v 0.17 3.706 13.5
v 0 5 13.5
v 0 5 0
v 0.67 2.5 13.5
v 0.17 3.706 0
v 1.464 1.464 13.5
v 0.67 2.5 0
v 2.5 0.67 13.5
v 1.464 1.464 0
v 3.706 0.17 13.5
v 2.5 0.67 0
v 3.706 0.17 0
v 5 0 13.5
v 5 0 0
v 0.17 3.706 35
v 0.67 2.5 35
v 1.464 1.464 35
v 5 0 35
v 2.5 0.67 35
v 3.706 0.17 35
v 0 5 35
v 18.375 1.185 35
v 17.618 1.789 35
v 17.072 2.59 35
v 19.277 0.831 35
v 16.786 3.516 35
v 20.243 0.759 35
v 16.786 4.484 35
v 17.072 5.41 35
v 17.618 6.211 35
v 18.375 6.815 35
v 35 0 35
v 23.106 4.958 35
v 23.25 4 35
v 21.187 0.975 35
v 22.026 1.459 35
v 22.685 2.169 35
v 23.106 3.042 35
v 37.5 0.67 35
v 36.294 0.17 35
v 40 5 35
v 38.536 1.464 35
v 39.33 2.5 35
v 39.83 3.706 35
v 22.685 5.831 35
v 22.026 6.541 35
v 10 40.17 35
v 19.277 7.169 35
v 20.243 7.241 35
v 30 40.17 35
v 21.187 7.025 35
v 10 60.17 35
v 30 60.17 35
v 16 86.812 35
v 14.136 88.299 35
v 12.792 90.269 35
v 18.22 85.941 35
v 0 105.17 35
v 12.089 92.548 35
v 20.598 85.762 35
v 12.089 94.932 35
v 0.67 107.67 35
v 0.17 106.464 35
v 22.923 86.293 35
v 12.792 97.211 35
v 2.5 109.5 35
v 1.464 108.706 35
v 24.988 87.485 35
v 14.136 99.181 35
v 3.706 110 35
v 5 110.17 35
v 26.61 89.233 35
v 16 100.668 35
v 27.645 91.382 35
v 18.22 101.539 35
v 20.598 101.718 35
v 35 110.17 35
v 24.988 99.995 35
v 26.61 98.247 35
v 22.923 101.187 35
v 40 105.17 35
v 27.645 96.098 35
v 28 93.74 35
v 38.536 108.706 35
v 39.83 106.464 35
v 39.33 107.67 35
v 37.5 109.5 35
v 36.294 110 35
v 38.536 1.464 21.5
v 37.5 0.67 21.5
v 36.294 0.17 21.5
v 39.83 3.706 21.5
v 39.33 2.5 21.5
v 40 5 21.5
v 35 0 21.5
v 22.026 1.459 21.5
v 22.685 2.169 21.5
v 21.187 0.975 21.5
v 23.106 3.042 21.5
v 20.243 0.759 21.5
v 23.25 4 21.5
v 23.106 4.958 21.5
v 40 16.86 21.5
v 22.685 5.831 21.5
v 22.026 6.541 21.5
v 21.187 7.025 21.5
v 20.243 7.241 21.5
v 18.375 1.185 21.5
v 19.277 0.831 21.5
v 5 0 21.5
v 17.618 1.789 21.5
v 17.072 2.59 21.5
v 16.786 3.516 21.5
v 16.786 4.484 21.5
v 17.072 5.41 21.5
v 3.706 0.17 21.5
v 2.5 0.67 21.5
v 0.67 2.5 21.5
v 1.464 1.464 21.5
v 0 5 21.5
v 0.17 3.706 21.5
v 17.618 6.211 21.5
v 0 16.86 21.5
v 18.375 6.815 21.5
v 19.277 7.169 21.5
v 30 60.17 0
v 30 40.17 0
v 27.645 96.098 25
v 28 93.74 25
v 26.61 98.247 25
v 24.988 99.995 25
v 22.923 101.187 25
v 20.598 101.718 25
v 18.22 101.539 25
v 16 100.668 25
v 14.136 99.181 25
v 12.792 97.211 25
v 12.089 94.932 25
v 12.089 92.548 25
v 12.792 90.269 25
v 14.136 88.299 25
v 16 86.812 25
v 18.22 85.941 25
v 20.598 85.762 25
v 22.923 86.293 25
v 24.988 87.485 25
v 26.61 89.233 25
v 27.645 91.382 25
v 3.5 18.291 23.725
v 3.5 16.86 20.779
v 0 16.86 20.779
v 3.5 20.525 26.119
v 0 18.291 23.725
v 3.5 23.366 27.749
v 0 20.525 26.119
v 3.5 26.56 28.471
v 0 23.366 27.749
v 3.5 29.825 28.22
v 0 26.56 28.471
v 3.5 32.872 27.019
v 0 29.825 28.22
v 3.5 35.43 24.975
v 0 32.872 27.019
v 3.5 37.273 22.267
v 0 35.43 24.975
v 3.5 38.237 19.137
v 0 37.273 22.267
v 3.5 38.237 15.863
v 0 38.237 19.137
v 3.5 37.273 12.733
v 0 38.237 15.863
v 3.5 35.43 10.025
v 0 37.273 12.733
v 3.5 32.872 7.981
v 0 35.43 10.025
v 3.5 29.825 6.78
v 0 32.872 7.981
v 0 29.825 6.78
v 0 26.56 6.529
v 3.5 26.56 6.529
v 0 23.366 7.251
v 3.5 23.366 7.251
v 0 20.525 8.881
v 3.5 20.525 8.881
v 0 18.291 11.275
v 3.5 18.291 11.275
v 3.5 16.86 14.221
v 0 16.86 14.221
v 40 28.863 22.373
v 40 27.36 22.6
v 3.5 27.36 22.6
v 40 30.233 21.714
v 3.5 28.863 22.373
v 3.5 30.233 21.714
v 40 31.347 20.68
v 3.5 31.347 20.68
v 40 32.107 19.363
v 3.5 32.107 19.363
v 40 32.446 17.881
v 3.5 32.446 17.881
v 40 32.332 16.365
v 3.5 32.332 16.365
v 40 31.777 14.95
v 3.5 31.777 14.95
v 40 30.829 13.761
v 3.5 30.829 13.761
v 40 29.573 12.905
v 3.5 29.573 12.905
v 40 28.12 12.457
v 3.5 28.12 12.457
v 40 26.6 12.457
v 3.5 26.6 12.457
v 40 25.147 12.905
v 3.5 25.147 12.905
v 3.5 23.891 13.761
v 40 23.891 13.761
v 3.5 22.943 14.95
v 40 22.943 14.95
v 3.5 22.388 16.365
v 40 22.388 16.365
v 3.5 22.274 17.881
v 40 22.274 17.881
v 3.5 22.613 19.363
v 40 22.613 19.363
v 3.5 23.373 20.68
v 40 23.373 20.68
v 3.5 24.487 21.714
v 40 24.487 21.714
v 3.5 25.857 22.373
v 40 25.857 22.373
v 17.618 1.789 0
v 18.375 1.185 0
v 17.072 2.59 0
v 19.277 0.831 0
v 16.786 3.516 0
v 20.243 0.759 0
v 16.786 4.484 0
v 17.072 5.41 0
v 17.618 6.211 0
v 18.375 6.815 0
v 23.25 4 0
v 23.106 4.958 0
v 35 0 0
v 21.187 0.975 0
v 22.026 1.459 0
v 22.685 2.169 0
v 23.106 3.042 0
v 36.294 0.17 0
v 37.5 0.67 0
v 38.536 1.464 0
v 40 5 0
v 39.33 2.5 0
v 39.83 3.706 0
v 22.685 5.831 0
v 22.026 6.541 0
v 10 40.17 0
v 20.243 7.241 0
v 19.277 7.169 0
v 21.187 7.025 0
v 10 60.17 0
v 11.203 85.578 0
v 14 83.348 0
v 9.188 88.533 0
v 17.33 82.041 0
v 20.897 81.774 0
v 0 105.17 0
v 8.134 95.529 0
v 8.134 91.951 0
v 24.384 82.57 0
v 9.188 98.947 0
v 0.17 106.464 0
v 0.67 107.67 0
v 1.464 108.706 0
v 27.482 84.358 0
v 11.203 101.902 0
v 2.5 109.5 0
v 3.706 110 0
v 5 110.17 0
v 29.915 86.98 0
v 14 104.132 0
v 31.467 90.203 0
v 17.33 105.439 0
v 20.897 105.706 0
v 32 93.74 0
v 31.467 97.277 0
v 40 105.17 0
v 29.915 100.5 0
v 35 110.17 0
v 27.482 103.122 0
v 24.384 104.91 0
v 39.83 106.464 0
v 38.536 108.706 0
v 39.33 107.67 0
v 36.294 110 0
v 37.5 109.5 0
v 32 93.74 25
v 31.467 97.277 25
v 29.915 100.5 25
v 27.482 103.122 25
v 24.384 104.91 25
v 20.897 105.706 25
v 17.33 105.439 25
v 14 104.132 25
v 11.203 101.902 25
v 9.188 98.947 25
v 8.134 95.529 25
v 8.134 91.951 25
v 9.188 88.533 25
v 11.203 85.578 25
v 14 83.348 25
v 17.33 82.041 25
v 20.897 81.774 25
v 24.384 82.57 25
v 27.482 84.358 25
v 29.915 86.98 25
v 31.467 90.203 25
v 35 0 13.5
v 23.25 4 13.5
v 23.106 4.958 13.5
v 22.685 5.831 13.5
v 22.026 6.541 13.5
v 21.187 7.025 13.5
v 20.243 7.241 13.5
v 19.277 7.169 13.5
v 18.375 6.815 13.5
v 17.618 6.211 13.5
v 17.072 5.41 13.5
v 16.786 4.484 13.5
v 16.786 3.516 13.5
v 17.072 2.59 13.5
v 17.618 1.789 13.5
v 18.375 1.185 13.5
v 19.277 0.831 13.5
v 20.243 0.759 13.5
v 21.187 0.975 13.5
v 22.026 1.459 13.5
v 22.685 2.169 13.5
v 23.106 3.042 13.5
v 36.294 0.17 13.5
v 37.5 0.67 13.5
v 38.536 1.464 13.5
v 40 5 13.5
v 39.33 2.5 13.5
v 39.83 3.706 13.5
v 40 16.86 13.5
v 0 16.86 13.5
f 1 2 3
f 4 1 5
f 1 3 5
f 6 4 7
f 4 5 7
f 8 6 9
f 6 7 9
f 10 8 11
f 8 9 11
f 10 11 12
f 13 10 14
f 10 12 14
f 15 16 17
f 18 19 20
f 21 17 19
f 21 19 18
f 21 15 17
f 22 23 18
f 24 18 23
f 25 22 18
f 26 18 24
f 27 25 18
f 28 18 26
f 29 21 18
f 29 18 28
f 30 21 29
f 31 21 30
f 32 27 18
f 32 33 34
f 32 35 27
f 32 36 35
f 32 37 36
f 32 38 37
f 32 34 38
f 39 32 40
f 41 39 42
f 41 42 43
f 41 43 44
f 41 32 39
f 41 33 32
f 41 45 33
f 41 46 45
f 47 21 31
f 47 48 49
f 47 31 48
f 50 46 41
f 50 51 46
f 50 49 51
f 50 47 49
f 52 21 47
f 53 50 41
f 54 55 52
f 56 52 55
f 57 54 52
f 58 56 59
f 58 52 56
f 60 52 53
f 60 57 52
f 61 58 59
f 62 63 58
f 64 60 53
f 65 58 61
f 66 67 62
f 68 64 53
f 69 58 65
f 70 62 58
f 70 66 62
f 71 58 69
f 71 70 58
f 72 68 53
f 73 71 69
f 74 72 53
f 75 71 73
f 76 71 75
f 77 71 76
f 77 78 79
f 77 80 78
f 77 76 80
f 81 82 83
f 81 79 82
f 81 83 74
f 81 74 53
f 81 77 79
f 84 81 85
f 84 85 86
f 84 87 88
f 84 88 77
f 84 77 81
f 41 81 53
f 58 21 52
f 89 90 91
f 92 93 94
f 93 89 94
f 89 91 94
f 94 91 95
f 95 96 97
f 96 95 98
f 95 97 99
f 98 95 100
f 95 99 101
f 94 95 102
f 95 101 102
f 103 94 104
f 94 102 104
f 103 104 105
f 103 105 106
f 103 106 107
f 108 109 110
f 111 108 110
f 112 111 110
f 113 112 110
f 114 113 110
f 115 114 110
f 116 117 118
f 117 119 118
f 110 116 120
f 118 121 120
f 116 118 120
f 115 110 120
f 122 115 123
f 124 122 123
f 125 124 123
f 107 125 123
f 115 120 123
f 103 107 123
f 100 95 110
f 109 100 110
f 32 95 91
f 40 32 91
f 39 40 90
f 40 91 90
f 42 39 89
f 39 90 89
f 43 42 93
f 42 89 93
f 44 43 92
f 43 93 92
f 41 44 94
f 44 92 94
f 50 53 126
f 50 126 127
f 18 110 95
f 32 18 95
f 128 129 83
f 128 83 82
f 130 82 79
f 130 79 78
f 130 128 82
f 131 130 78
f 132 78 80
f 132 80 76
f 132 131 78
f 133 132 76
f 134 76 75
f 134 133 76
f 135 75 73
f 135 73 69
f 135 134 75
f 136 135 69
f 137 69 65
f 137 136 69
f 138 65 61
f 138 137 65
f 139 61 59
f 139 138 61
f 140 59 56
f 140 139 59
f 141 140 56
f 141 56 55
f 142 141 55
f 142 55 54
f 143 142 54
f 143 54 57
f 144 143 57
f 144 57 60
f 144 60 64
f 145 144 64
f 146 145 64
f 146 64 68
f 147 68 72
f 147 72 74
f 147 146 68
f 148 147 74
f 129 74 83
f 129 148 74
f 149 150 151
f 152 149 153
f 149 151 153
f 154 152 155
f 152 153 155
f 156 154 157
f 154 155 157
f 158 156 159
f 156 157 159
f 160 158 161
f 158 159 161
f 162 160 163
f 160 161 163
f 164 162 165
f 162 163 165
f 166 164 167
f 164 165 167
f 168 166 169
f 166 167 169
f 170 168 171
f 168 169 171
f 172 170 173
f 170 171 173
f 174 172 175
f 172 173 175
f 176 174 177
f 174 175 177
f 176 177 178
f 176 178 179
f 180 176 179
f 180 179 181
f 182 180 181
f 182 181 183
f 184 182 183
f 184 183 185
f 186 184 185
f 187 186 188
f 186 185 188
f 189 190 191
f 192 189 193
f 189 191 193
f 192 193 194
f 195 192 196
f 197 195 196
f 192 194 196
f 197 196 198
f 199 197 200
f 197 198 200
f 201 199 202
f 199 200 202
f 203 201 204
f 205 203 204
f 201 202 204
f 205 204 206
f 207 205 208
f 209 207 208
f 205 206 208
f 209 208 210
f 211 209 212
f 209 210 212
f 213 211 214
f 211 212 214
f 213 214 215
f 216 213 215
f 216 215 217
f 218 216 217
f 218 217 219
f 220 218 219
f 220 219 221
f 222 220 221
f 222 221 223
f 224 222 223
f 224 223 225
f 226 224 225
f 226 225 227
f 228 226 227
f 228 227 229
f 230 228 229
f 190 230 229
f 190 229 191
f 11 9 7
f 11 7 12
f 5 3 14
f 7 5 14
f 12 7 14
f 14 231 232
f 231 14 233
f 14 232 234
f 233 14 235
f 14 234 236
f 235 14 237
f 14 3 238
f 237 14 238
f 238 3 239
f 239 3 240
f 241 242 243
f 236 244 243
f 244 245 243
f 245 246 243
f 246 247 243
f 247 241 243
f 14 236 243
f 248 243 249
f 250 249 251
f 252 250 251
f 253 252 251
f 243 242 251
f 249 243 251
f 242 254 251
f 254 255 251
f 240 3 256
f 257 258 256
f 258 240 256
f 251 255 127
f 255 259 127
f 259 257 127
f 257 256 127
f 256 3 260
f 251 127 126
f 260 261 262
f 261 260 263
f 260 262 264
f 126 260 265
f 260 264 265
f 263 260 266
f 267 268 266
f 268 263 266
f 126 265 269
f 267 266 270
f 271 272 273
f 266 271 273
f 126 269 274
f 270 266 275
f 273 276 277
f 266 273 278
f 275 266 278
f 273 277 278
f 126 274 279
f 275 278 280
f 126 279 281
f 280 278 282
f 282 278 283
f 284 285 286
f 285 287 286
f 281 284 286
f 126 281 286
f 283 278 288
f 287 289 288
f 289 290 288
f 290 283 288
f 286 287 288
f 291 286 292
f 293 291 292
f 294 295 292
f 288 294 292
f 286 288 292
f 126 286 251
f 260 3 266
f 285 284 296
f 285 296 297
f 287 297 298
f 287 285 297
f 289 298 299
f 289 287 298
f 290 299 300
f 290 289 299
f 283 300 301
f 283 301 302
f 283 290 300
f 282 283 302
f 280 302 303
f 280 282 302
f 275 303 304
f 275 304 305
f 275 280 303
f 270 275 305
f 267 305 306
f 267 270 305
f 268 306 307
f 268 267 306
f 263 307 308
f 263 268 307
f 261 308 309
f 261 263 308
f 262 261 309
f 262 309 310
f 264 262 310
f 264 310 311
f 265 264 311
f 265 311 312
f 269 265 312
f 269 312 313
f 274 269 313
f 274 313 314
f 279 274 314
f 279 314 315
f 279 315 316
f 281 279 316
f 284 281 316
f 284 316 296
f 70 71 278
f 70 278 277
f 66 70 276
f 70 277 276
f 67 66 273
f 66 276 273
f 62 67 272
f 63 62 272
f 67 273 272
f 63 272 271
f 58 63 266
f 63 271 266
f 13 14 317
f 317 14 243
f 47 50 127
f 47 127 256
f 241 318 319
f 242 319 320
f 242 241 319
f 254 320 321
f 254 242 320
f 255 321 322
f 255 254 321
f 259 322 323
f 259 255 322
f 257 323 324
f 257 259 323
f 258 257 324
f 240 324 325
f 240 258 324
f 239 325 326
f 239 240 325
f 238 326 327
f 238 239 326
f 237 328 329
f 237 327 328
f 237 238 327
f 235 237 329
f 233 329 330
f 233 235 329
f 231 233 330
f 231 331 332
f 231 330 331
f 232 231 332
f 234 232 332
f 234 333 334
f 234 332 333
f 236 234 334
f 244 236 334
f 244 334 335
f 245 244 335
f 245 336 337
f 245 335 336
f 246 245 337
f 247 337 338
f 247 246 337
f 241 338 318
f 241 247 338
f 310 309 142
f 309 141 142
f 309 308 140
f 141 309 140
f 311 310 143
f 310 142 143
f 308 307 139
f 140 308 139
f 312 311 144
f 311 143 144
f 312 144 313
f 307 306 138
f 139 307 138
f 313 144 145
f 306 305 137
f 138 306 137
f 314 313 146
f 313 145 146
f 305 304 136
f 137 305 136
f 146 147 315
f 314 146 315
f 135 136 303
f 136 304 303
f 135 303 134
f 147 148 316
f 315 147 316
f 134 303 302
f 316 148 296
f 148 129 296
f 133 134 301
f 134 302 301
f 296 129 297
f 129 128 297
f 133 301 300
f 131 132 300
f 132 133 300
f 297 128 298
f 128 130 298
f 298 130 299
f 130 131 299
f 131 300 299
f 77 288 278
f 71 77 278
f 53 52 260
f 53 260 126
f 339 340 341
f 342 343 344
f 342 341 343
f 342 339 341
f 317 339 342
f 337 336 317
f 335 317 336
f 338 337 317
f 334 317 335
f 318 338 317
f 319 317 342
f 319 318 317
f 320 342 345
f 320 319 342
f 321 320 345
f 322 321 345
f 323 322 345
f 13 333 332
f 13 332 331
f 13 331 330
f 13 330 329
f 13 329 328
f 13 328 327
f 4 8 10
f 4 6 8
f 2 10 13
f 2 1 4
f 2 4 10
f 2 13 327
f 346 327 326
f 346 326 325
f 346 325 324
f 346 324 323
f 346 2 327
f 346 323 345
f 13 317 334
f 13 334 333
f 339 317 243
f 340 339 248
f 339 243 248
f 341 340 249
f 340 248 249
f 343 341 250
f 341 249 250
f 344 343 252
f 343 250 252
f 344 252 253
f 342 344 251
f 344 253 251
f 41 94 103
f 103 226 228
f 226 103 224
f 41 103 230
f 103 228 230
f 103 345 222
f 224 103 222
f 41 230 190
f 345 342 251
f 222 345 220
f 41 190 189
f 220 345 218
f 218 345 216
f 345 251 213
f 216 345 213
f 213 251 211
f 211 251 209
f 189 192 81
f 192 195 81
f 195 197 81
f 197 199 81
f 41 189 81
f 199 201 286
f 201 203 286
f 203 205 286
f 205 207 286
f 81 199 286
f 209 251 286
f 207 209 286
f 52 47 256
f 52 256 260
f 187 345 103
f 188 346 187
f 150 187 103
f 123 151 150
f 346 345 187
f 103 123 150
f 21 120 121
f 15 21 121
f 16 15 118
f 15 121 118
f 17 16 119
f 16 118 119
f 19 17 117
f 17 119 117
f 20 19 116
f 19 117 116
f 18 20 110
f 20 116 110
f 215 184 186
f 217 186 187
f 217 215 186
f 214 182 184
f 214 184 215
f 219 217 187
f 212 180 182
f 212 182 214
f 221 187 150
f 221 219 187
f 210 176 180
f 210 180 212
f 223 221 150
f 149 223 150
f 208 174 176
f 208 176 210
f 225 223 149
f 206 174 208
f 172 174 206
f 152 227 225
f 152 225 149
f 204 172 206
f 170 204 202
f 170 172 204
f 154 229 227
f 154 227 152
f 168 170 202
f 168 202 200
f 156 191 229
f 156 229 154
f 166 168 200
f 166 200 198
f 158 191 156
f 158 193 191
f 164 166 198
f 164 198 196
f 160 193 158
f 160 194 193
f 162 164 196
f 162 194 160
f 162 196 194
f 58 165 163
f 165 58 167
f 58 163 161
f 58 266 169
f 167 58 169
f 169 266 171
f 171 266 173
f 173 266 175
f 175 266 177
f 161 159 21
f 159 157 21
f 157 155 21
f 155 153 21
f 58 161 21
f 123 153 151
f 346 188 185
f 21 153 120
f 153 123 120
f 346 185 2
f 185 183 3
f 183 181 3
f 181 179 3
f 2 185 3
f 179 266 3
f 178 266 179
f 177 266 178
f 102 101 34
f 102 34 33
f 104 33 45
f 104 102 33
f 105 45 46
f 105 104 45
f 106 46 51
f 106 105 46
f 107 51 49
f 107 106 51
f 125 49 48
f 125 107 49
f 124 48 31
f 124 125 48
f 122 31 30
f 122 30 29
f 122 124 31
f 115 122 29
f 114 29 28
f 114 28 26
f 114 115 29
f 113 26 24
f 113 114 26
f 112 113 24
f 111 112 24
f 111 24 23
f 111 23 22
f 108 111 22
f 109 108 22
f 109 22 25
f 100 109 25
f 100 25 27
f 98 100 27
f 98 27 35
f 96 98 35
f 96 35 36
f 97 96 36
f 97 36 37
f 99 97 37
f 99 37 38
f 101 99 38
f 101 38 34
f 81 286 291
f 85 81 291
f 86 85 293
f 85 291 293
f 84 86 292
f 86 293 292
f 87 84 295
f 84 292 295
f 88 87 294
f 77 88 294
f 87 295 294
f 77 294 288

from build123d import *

# Parameters (mm, degrees)
CROQUIS1_R              = 12
CROQUIS1_R_2            = 3.25
SALIENTE_EXTRUIR1_DEPTH = 35
SALIENTE_EXTRUIR2_START = -10
CROQUIS2_R              = 12
CROQUIS2_R_2            = 8
SALIENTE_EXTRUIR2_DEPTH = 10
CROQUIS3_R              = 5.1
CROQUIS3_W              = 8
CROQUIS3_H              = 16.86
CORTAR_EXTRUIR2_DEPTH   = 123.321007599
CROQUIS4_R              = 11
CORTAR_EXTRUIR3_DEPTH   = 3.5


with BuildPart() as part:
    # Croquis1 → Saliente-Extruir1 (new body)
    # profile 1 of 2: a face of its own
    with BuildSketch(Plane.XY):
        with BuildLine():
            Line((0, 105.17), (0, 40.17))
            Line((0, 40.17), (10, 40.17))
            Line((10, 40.17), (10, 60.17))
            Line((10, 60.17), (30, 60.17))
            Line((30, 60.17), (30, 40.17))
            Line((30, 40.17), (40, 40.17))
            Line((40, 40.17), (40, 105.17))
            ThreePointArc((40, 105.17), (38.535533906, 108.705533906), (35, 110.17))
            Line((35, 110.17), (5, 110.17))
            ThreePointArc((5, 110.17), (1.464466094, 108.705533906), (0, 105.17))
        make_face()
        with Locations((20, 93.74)):
            Circle(CROQUIS1_R, mode=Mode.SUBTRACT)
    # profile 2 of 2: a face of its own
    with BuildSketch(Plane.XY):
        with BuildLine():
            Line((5, 0), (35, 0))
            ThreePointArc((35, 0), (38.535533906, 1.464466094), (40, 5))
            Line((40, 5), (40, 40.17))
            Line((40, 40.17), (0, 40.17))
            Line((0, 40.17), (0, 5))
            ThreePointArc((0, 5), (1.464466094, 1.464466094), (5, 0))
        make_face()
        with Locations((20, 4)):
            Circle(CROQUIS1_R_2, mode=Mode.SUBTRACT)
    extrude(amount=SALIENTE_EXTRUIR1_DEPTH)

    # Croquis2 → Saliente-Extruir2 (add)
    with BuildSketch(Plane.XY.offset(35).offset(SALIENTE_EXTRUIR2_START)):
        with Locations((20, 93.74)):
            Circle(CROQUIS2_R)
        with Locations((20, 93.74)):
            Circle(CROQUIS2_R_2, mode=Mode.SUBTRACT)
    extrude(amount=SALIENTE_EXTRUIR2_DEPTH)

    # Croquis3 → Cortar-Extruir2 (cut, through all)
    with BuildSketch(Plane.ZY):
        with Locations((17.5, 27.36)):
            Circle(CROQUIS3_R)
        with Locations((17.5, 8.43)):
            Rectangle(CROQUIS3_W, CROQUIS3_H)
    extrude(amount=-CORTAR_EXTRUIR2_DEPTH, mode=Mode.SUBTRACT)

    # Croquis4 → Cortar-Extruir3 (cut)
    with BuildSketch(Plane.ZY):
        with Locations((17.5, 27.36)):
            Circle(CROQUIS4_R)
    extrude(amount=-CORTAR_EXTRUIR3_DEPTH, mode=Mode.SUBTRACT)


solid = part.part
